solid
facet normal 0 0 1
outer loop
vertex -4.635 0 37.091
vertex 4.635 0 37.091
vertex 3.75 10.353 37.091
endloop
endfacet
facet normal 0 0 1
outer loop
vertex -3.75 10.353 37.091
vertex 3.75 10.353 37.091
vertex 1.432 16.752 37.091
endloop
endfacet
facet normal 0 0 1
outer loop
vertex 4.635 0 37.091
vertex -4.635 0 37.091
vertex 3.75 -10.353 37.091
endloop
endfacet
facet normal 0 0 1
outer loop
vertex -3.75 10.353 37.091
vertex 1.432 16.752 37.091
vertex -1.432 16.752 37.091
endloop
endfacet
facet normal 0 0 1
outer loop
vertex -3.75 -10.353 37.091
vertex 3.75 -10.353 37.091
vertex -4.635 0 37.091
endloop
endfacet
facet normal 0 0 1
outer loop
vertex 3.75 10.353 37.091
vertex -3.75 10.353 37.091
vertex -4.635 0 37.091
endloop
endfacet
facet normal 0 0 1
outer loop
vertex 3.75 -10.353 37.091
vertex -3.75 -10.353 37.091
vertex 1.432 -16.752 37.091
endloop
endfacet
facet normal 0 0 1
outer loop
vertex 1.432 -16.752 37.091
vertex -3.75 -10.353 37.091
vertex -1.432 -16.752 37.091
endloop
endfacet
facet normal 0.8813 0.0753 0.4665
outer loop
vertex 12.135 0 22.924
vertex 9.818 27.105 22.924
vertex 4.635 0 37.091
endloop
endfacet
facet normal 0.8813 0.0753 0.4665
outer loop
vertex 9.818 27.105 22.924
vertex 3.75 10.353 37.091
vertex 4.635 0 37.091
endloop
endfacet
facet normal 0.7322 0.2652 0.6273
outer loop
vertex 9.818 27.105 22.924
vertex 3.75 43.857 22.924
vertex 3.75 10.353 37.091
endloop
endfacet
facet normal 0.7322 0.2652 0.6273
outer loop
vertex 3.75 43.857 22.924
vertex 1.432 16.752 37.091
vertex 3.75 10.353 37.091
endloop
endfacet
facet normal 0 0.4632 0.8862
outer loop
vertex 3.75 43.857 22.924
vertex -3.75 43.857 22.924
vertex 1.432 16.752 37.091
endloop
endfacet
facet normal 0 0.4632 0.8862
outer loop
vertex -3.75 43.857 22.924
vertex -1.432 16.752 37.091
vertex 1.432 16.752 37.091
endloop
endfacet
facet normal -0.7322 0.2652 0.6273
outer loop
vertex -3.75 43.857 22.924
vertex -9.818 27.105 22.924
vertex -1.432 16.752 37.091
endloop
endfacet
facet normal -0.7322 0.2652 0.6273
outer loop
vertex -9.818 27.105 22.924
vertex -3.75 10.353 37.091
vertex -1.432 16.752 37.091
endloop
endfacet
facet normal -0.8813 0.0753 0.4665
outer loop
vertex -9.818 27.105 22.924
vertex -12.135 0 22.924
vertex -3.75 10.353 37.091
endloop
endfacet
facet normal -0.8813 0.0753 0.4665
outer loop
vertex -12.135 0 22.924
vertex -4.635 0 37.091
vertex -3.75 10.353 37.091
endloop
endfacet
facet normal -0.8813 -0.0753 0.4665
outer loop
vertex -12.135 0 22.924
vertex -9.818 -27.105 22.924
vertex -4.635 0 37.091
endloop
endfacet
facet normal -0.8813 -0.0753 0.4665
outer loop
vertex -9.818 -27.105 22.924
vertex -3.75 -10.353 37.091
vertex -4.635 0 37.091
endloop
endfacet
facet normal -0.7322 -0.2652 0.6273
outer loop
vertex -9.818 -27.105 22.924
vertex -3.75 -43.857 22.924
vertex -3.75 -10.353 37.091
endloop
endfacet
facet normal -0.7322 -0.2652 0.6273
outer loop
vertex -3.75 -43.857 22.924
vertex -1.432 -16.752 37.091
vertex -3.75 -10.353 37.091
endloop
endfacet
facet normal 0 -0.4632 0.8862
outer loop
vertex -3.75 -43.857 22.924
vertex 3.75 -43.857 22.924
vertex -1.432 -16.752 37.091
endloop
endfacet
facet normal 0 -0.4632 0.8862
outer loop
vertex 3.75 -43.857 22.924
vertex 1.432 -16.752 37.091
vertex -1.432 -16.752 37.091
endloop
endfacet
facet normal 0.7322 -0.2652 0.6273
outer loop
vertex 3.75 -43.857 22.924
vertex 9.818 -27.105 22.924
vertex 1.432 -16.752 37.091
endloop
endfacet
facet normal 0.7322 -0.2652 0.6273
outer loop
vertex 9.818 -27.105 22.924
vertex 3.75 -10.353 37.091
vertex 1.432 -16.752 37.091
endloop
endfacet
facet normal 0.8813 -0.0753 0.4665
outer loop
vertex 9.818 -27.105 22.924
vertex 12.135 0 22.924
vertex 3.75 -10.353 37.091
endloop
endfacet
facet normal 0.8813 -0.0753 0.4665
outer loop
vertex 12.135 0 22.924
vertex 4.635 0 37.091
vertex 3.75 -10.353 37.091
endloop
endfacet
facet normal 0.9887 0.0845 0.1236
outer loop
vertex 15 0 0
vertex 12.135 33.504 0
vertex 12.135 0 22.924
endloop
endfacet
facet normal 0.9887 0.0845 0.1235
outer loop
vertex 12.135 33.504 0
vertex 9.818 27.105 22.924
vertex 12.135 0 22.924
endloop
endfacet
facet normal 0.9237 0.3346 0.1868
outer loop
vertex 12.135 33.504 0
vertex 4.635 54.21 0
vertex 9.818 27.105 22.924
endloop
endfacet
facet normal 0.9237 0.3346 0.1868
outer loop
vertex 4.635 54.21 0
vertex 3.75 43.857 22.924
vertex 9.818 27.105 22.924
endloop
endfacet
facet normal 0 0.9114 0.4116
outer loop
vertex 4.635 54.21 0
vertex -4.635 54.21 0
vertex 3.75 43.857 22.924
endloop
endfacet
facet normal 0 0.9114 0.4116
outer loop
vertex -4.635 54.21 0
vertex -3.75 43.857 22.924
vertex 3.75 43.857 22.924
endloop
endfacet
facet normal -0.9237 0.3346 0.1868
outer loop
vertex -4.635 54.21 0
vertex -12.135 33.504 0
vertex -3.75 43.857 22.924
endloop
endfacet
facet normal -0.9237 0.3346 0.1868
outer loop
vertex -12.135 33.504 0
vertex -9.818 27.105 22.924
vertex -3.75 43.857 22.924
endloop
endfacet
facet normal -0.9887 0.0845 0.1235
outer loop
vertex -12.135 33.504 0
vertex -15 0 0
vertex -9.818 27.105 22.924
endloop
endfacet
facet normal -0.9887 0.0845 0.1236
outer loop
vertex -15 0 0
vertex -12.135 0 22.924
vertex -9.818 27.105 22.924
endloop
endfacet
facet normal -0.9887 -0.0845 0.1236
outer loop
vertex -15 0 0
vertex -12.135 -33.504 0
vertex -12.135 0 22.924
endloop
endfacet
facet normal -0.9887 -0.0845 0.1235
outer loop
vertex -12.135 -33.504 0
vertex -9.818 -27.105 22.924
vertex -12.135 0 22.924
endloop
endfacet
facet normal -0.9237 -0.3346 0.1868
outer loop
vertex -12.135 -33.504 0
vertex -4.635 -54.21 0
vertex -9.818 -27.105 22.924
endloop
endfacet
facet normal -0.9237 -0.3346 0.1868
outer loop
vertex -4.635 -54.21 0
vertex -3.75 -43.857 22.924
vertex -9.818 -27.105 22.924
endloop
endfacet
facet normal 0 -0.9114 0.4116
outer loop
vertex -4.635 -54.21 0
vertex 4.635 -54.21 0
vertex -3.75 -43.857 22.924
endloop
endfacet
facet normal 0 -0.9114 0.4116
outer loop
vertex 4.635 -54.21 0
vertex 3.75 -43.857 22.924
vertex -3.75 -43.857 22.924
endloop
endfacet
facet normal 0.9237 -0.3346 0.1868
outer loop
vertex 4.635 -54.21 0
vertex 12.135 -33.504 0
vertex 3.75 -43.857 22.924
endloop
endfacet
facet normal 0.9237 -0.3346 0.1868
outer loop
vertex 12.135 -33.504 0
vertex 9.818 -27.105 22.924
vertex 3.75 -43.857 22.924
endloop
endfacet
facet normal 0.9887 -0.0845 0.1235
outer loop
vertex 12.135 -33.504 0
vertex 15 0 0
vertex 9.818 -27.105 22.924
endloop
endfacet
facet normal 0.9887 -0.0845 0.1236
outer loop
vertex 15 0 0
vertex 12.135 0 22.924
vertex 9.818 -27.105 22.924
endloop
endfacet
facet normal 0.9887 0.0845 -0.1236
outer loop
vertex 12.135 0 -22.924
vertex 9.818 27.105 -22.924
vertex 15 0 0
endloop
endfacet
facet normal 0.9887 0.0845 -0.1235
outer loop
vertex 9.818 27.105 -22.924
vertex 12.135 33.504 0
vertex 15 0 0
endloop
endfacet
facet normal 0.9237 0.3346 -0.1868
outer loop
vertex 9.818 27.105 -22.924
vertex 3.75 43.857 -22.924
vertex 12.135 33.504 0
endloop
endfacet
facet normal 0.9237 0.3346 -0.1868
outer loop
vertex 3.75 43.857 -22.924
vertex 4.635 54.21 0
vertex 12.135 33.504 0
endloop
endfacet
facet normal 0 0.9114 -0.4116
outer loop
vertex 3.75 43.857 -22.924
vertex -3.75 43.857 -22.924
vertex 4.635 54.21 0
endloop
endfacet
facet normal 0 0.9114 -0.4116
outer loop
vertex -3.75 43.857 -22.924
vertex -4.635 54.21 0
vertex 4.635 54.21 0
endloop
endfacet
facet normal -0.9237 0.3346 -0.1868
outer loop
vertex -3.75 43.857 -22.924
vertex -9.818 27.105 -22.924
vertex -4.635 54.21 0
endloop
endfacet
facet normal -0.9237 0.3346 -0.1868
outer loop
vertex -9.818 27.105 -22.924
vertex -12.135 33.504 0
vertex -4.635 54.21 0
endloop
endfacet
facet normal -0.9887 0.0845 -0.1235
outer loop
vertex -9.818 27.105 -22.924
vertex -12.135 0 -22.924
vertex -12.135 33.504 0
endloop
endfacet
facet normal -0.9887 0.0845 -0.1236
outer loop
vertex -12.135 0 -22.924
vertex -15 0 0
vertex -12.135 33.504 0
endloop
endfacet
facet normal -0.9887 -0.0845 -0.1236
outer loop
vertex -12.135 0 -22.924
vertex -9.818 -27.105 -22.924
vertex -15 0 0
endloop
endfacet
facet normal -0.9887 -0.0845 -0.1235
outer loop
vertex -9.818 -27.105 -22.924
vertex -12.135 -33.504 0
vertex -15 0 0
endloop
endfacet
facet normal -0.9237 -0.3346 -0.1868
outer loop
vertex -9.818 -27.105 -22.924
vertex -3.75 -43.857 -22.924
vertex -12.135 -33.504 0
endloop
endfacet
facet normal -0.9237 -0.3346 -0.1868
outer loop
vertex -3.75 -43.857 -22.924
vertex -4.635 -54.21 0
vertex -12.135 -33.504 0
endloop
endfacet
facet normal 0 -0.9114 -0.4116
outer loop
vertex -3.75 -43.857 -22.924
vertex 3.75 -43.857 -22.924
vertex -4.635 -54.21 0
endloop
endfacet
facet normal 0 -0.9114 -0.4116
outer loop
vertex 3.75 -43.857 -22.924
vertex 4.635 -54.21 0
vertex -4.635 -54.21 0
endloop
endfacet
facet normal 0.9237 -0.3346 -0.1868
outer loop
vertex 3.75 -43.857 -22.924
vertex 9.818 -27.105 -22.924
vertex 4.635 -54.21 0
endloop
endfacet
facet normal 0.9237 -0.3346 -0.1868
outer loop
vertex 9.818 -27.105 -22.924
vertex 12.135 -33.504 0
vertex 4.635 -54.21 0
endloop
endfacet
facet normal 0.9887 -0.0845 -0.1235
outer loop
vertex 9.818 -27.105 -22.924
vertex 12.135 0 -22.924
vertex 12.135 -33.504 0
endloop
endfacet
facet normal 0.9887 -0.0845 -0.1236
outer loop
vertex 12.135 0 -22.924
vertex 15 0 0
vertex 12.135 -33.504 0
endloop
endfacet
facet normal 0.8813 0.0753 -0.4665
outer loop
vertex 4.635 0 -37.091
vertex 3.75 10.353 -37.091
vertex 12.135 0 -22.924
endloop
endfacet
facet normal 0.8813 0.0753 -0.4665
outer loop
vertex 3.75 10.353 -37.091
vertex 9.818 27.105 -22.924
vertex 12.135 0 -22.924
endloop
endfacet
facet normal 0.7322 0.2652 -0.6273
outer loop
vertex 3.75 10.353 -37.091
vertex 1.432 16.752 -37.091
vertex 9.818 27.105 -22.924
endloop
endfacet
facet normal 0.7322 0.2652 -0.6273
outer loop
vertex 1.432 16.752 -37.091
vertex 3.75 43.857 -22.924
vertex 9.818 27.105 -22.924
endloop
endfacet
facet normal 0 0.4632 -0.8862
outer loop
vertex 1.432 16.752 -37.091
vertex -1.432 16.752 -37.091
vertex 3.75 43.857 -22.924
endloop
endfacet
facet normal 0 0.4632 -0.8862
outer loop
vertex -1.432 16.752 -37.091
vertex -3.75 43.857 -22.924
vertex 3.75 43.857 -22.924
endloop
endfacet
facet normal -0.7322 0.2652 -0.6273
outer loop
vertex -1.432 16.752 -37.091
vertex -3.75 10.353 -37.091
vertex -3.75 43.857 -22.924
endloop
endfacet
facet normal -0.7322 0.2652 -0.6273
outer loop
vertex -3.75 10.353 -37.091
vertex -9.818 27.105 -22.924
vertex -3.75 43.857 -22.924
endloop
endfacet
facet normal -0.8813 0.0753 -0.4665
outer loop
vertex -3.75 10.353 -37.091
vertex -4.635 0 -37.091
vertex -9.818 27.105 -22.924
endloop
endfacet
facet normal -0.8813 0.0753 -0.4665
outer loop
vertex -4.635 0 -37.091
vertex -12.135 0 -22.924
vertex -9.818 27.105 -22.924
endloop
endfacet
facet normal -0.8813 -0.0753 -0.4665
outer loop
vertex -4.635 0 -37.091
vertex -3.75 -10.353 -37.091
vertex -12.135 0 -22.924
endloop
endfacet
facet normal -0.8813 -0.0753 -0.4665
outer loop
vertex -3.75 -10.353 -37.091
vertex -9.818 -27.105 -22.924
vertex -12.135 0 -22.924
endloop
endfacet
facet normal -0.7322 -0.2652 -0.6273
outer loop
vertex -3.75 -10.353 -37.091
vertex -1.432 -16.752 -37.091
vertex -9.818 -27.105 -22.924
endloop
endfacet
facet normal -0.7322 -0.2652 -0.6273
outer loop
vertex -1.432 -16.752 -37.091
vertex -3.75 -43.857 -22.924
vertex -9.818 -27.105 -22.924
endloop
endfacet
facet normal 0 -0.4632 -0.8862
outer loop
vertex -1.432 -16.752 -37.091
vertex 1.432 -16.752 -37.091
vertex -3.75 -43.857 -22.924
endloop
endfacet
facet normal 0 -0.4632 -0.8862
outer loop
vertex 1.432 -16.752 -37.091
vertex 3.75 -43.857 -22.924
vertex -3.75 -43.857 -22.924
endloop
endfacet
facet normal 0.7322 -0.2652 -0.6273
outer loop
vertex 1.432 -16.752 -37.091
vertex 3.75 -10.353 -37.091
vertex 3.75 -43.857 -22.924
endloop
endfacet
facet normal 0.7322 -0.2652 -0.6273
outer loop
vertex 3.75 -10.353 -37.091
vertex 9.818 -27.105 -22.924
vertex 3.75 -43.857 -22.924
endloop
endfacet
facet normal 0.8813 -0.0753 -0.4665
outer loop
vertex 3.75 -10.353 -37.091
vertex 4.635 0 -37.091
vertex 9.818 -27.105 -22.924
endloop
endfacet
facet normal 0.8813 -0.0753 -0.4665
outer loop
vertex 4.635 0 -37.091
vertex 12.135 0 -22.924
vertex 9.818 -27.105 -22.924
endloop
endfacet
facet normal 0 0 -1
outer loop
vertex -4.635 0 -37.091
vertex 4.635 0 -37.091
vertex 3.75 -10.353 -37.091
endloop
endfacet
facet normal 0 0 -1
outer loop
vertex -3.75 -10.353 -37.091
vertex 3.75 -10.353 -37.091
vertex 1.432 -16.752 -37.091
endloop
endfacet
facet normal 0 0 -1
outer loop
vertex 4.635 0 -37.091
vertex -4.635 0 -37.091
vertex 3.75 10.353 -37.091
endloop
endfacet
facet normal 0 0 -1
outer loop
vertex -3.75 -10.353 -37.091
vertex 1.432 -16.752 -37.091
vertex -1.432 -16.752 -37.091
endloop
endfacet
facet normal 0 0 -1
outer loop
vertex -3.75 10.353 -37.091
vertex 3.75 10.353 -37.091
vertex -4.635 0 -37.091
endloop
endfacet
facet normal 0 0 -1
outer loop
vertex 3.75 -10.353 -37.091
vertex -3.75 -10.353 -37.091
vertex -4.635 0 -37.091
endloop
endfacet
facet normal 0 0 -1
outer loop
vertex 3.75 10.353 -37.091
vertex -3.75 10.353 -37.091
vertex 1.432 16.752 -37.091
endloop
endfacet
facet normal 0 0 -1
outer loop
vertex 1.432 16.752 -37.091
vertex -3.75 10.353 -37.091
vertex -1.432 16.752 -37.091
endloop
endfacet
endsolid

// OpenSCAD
// Generated by SolidPython 1.0.1 on 2020-07-29 00:46:47


scale(v = [5, 19, 13]) {
	sphere(r = 3);
}
/***********************************************
*********      SolidPython code:      **********
************************************************
 
# import packages: SolidPython
from solid import *
from solid.utils import *
from itertools import chain, combinations, permutations


class Resize:

    def __init__(self, scad_file):
        self.scad_file = scad_file
        #self.scad_file = import_scad(scad_file)
        # cone/cylinder param:
        self.r1 = 0
        self.r2 = 0
        self.h = 0
        # rectangular prism param:
        self.w = 0
        self.l = 0
        # ellipse param:
        self.r = 0

    # import OpenScad code (file name corresponds to shape)


    # classify shape + parameters
    def assign(self, param1, param2, param3):
        if self.scad_file == 'cone.scad':
            self.r1 = param1
            self.r2 = param2
            self.h = param3
        elif self.scad_file == 'cylinder.scad':
            self.r1 = param1
            self.r2 = param2
            self.h = param3
        elif self.scad_file == 'rectangularPrism.scad':
            self.h = param1
            self.l = param2
            self.w = param3
        else:
            self.r = param1
            self.h = param2

    # resize parameters
    def iterate(self):
        x = range(3, 20, 2)
        i = 1
        if self.scad_file == 'cone.scad':
            tempList = list(permutations(x, 2))
            for temp in tempList:
                param1 = temp[0]
                param2 = temp[1]
                filepath = 'produced_scad_files/' + 'cone' + str(param1) + '_' + str(param2) + '_' + '.scad'
                scad_render_to_file(cylinder(h=param1, r1=param2, r2=0), filepath)

        elif self.scad_file == 'cylinder.scad':
            tempList = list(permutations(x, 3))
            for temp in tempList:
                param1 = temp[0]
                param2 = temp[1]
                filepath = 'produced_scad_files/' + 'cylinder' + str(param1) + '_' + str(param2) + '_' + '.scad'
                scad_render_to_file(cylinder(h=param1, r1=param2, r2=param2), filepath)

        elif self.scad_file == 'rectangularPrism.scad':
            tempList = list(permutations(x, 3))
            for temp in tempList:
                param1 = temp[0]
                param2 = temp[1]
                param3 = temp[2]
                filepath = 'produced_scad_files/' + 'rectangularPrism' + str(param1) + '_' + str(param2) + '_' + str(
                    param3) + '.scad'
                scad_render_to_file(cube(size=(param1, param2, param3)), filepath)

        elif self.scad_file == 'ellipse.scad':
            tempList = list(permutations(x, 4))
            for temp in tempList:
                param1 = temp[0]
                param2 = temp[1]
                param3 = temp[2]
                param4 = temp[3]
                filepath = 'produced_scad_files/' + 'ellipse' + str(param1) + '_' + str(param2) + '_' + str(param3) + '_' + str(param4) + '.scad'
                scad_render_to_file(scale([param1, param2, param3])(sphere(r=param4)), filepath)

    def render_to_scadfile(self):
        scad_render_to_file(scad, 'example.scad') 
 
************************************************/
